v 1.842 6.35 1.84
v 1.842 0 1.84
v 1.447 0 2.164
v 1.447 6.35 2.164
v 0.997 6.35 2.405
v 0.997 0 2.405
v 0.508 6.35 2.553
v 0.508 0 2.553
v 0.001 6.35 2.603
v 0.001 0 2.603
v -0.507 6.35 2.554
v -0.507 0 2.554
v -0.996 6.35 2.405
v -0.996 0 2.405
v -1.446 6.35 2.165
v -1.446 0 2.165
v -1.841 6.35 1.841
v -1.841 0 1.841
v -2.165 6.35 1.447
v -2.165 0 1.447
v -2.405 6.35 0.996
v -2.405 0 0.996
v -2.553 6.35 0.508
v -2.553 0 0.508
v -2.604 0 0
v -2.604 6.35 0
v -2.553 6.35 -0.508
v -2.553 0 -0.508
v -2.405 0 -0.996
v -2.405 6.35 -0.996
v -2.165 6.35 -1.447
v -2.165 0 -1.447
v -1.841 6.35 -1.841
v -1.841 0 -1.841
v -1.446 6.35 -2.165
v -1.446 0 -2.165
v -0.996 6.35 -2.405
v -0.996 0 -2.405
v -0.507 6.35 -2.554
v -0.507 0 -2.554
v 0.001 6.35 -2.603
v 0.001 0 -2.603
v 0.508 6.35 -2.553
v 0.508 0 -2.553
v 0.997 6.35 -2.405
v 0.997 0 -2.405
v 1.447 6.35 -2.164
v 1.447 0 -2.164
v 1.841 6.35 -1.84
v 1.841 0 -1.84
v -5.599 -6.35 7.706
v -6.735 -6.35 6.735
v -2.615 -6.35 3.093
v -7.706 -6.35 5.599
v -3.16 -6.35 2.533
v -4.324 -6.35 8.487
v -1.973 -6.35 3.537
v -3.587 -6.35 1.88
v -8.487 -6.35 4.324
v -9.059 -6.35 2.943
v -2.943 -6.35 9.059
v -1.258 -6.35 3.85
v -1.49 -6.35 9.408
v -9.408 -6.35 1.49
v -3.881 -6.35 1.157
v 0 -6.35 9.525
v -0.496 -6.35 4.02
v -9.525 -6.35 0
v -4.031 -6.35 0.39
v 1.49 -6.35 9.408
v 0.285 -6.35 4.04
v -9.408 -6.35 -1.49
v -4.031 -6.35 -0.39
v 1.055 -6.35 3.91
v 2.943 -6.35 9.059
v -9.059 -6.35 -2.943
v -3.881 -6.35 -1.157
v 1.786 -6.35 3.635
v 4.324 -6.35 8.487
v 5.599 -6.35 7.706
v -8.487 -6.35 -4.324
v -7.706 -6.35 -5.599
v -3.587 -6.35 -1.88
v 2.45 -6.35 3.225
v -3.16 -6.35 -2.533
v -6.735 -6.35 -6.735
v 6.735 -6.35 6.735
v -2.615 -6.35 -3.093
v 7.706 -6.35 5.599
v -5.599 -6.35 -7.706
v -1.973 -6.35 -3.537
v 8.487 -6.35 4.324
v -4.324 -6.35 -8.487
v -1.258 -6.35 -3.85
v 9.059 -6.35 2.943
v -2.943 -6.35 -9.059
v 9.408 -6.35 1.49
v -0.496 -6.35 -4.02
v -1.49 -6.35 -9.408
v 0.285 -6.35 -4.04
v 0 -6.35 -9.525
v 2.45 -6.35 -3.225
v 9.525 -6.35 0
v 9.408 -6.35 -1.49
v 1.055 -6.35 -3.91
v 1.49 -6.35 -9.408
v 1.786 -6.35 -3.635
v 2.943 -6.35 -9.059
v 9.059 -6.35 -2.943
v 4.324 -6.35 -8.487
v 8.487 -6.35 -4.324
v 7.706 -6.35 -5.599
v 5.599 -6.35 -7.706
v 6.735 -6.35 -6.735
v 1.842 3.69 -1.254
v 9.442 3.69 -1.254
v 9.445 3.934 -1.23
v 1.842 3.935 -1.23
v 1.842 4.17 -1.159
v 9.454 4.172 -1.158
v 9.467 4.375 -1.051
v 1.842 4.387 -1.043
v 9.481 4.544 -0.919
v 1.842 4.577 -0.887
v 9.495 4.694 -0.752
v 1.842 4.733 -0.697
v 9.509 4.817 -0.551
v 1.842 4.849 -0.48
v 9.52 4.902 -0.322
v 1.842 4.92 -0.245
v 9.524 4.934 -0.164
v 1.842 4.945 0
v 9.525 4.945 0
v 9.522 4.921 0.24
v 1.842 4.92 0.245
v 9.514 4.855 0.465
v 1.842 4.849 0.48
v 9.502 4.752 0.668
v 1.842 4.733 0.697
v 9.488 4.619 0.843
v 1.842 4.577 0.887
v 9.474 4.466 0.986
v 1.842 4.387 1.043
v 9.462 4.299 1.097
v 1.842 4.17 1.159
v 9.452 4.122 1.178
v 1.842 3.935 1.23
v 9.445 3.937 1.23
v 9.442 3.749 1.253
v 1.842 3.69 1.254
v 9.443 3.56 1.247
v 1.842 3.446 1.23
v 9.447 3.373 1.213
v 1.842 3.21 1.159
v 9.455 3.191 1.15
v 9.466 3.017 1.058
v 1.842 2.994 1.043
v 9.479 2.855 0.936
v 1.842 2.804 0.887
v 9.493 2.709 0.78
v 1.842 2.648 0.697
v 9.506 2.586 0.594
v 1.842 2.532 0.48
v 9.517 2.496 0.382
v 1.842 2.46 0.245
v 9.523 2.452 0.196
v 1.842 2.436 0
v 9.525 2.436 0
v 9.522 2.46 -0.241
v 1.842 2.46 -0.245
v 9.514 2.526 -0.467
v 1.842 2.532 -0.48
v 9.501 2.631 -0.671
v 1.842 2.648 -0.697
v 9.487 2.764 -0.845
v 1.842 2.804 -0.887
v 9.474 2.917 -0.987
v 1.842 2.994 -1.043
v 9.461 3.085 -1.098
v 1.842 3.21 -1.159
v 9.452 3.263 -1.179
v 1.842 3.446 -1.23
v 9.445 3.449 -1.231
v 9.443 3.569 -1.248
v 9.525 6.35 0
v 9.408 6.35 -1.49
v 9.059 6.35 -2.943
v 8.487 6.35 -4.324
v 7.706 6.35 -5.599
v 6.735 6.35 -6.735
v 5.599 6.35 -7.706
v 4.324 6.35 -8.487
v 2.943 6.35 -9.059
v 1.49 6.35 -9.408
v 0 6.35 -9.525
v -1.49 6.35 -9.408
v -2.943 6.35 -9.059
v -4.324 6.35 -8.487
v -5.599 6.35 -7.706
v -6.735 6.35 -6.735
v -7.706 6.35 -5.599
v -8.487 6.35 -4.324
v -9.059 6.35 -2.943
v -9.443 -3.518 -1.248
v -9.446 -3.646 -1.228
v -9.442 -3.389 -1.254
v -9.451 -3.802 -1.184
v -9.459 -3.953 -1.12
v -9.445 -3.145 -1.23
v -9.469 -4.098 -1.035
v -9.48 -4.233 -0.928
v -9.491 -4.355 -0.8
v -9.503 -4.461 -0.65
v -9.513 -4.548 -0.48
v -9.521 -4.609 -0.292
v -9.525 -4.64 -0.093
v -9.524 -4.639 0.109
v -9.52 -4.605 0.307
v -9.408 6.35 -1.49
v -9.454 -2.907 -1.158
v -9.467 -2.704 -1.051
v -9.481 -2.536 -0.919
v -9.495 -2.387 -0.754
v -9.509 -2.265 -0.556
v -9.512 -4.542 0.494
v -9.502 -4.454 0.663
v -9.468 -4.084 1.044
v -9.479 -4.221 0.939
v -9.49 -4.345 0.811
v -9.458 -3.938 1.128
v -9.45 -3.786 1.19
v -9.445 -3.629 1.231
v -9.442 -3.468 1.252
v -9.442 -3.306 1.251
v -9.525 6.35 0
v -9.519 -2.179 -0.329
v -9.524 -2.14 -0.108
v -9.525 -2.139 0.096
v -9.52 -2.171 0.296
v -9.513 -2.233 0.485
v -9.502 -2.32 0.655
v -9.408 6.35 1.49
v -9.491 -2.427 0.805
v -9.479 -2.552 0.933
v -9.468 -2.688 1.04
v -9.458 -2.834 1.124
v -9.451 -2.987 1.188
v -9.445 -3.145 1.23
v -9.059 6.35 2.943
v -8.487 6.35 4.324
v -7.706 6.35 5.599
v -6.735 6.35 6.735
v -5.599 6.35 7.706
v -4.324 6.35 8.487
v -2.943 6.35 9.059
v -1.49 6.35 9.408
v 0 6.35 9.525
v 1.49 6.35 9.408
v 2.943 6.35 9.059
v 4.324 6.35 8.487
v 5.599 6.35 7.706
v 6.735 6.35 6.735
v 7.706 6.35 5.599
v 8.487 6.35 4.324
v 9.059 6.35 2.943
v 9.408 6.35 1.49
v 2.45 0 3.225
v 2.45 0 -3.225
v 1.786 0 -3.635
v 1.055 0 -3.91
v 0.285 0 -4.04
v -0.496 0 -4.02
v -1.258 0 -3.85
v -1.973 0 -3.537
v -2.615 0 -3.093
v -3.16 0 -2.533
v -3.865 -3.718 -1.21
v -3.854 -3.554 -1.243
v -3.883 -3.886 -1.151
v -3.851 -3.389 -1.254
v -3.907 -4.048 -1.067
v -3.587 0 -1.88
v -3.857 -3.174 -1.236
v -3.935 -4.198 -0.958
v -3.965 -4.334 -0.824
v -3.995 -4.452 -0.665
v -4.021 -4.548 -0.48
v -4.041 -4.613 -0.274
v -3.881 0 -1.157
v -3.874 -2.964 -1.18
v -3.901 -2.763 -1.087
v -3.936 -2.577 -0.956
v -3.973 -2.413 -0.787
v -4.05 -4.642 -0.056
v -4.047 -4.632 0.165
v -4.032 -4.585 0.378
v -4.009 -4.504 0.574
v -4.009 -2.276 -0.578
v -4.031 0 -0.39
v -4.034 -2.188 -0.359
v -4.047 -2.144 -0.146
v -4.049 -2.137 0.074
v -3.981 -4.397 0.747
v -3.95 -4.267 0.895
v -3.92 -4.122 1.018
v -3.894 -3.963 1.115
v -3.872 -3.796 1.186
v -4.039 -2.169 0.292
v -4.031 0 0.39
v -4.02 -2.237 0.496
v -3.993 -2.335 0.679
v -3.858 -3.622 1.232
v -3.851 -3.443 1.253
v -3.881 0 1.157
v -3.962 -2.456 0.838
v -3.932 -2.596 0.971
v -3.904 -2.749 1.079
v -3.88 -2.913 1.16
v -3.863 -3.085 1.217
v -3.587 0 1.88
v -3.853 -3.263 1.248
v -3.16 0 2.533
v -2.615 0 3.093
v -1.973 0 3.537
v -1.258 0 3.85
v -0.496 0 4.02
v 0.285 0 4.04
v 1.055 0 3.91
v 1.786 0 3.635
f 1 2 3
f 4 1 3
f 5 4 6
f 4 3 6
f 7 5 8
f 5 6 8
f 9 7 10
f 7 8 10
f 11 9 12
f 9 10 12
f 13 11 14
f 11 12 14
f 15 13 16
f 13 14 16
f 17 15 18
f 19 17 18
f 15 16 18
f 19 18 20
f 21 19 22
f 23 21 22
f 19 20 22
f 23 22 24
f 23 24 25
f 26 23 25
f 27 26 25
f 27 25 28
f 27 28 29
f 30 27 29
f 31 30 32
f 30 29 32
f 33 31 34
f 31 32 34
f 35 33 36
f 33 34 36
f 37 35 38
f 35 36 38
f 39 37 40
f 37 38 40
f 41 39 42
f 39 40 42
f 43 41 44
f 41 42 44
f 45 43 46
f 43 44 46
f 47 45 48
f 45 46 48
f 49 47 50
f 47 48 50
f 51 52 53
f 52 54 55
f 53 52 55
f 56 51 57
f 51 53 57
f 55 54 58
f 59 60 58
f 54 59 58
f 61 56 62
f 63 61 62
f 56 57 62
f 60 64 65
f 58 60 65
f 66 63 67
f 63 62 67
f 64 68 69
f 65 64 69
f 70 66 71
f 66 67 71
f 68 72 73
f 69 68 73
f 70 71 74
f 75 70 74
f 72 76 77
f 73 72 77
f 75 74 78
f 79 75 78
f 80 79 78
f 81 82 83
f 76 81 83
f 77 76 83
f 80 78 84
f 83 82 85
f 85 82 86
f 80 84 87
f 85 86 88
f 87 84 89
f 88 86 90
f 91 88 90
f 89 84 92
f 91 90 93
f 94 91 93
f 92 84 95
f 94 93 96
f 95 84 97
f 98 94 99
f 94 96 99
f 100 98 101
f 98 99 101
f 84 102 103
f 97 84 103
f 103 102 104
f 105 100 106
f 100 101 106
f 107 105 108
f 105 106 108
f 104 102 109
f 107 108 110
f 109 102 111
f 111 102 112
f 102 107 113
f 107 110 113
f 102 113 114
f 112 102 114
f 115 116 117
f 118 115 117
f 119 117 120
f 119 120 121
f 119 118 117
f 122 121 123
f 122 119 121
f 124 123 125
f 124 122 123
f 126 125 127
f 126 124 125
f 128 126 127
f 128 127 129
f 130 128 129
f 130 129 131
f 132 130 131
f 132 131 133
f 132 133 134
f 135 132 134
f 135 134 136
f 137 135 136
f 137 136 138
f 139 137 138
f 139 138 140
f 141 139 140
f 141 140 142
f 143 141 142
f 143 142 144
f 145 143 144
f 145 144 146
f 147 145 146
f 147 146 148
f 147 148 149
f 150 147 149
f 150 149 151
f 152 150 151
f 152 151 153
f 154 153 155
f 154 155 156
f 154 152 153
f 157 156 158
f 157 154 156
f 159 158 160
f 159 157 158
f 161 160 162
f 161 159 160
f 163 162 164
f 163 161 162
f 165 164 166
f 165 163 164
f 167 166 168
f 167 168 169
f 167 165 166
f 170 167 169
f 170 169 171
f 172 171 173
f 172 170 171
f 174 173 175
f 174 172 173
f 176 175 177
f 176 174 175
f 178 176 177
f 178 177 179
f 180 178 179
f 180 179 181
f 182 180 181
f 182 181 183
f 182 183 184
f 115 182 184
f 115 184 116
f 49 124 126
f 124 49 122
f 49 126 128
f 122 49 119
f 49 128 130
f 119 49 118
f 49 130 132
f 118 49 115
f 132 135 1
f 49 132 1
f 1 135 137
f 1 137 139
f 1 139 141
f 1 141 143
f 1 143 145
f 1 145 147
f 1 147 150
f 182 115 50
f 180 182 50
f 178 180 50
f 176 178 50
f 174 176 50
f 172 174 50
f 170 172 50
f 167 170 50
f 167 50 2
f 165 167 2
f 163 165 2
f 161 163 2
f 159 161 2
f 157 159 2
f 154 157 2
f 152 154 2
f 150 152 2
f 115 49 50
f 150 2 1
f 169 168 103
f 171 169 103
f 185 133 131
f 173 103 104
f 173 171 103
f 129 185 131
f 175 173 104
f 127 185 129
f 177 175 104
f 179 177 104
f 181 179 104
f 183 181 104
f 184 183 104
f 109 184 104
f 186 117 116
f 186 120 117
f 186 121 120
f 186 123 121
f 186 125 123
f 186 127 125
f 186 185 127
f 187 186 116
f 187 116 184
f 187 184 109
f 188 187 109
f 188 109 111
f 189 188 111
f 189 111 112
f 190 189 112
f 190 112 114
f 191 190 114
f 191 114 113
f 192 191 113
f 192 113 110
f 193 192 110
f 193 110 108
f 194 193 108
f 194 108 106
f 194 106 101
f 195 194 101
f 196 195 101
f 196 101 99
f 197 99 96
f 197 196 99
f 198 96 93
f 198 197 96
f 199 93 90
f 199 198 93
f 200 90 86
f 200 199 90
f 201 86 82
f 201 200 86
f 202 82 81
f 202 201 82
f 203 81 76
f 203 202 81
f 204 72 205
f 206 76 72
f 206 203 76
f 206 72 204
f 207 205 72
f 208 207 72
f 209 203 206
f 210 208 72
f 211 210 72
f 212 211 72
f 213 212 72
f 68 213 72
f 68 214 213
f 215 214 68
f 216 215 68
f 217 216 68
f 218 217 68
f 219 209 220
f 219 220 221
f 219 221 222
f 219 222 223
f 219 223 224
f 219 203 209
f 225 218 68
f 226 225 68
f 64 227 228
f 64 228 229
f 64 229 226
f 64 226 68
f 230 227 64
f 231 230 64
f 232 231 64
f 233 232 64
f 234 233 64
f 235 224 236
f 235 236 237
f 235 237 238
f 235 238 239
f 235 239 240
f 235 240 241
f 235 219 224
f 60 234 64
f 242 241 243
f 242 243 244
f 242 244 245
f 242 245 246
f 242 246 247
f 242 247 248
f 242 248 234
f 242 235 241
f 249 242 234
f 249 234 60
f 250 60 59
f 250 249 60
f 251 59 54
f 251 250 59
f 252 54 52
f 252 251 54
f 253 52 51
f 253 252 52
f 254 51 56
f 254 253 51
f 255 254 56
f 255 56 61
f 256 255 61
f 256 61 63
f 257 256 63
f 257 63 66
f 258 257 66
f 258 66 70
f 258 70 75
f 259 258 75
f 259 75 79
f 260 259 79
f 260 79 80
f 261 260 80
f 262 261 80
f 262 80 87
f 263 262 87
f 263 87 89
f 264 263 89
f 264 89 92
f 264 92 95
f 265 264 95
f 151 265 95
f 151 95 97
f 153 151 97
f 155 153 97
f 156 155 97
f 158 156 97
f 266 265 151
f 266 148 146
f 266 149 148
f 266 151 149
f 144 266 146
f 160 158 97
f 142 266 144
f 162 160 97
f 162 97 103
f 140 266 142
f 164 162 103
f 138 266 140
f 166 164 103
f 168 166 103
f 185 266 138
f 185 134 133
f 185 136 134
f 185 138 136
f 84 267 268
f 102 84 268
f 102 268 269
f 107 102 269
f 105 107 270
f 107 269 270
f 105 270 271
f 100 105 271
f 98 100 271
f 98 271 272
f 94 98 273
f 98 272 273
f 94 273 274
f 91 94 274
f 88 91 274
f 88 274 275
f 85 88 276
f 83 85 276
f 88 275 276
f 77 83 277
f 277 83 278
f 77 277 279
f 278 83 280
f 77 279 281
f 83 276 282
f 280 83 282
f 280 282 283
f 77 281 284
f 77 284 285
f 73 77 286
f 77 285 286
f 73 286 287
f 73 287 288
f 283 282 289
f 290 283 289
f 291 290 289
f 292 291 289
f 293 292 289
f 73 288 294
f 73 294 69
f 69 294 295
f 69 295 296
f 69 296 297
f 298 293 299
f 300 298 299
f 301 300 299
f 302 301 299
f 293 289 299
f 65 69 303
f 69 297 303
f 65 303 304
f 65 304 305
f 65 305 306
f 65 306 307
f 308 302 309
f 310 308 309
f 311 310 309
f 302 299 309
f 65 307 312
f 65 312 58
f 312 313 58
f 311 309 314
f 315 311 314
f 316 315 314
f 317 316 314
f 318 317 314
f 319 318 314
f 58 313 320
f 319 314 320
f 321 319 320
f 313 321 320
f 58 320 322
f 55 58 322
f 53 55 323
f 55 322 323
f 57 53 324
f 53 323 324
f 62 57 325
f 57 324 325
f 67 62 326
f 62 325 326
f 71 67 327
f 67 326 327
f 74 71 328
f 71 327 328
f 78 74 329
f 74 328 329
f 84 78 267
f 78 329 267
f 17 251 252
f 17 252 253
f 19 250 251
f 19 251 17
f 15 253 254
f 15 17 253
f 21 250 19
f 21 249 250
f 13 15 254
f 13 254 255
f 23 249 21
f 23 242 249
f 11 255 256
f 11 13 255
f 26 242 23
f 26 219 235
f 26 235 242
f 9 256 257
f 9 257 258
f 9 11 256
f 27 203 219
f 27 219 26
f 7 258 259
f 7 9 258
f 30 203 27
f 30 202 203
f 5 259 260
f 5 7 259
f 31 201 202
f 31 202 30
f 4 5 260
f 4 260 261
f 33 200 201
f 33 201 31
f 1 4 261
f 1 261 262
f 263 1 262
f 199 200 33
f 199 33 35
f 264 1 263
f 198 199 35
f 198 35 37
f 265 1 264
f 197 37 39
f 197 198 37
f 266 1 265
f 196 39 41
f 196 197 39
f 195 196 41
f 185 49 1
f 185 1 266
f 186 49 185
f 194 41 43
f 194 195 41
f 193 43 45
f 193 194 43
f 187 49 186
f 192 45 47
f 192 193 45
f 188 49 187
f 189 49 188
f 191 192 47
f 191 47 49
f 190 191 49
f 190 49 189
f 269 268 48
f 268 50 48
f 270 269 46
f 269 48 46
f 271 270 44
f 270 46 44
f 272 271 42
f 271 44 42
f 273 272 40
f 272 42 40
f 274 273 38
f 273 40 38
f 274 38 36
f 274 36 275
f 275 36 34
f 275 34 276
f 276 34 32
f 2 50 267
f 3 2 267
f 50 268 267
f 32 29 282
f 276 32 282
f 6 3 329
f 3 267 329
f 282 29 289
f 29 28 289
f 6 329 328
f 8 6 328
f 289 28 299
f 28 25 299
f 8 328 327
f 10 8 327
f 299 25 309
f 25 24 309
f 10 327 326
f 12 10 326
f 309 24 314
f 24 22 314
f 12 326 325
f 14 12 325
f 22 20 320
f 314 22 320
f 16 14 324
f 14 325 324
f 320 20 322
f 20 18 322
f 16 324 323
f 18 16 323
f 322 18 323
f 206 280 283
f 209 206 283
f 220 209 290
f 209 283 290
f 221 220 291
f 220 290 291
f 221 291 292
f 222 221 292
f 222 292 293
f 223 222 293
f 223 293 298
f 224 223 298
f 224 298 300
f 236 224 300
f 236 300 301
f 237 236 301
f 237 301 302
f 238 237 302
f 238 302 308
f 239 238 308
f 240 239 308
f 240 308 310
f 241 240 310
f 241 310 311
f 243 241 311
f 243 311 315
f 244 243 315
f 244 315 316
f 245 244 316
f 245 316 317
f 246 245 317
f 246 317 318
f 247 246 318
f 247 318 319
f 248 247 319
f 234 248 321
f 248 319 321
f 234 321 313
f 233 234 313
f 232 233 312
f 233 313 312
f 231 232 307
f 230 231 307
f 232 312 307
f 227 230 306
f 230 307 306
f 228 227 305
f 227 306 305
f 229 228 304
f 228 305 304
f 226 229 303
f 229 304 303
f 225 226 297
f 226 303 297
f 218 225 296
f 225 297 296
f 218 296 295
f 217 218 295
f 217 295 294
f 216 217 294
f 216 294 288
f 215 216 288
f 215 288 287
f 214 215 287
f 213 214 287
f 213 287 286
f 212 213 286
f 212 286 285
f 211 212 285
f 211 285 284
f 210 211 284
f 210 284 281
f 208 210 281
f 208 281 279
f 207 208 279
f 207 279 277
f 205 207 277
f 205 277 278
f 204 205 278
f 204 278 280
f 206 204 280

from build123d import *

# Parameters (mm, degrees)
SKETCH1_R           = 9.525
BOSS_EXTRUDE1_DEPTH = 6.35
CUT_EXTRUDE1_START  = -6.35
CUT_EXTRUDE1_DEPTH  = 6.35
CUT_EXTRUDE2_START  = -6.35
CUT_EXTRUDE2_DEPTH  = 6.35
SKETCH4_R           = 1.254125
CUT_EXTRUDE3_DEPTH  = 10.525
SKETCH4_3_R         = 1.254125
CUT_EXTRUDE4_DEPTH  = 10.5250001


with BuildPart() as part:
    # Sketch1 → Boss-Extrude1 (new body, symmetric)
    with BuildSketch(Plane(origin=(0, 0, 0), x_dir=(1, 0, 0), z_dir=(0, 1, 0))):
        Circle(SKETCH1_R)
    extrude(amount=BOSS_EXTRUDE1_DEPTH, both=True)

    # Sketch2 → Cut-Extrude1 (cut)
    with BuildSketch(Plane(origin=(0, 6.35, 0), x_dir=(1, 0, 0), z_dir=(0, 1, 0)).offset(CUT_EXTRUDE1_START)):
        with BuildLine():
            Line((1.8415, 1.840404847), (1.8415, -1.840404847))
            ThreePointArc((1.8415, -1.840404847), (-2.6035, 0), (1.8415, 1.840404847))
        make_face()
    extrude(amount=CUT_EXTRUDE1_DEPTH, mode=Mode.SUBTRACT)

    # Sketch3 → Cut-Extrude2 (cut)
    with BuildSketch(Plane.XZ.offset(6.35).offset(CUT_EXTRUDE2_START)):
        with BuildLine():
            Line((2.449999926, 3.224903191), (2.449999926, -3.224903191))
            ThreePointArc((2.449999926, -3.224903191), (-4.050000028, 0), (2.449999926, 3.224903191))
        make_face()
    extrude(amount=CUT_EXTRUDE2_DEPTH, mode=Mode.SUBTRACT)

    # Sketch4 → Cut-Extrude3 (cut, through all)
    with BuildSketch(Plane(origin=(0, 0, 0), x_dir=(0, 0, -1), z_dir=(1, 0, 0))):
        with Locations((0, -3.389153937)):
            Circle(SKETCH4_R)
    extrude(amount=-CUT_EXTRUDE3_DEPTH, mode=Mode.SUBTRACT)

    # Sketch4<3> → Cut-Extrude4 (cut, through all)
    with BuildSketch(Plane(origin=(0, 0, 0), x_dir=(0, 0, -1), z_dir=(1, 0, 0))):
        with Locations((0, 3.690412064)):
            Circle(SKETCH4_3_R)
    extrude(amount=CUT_EXTRUDE4_DEPTH, mode=Mode.SUBTRACT)


solid = part.part
